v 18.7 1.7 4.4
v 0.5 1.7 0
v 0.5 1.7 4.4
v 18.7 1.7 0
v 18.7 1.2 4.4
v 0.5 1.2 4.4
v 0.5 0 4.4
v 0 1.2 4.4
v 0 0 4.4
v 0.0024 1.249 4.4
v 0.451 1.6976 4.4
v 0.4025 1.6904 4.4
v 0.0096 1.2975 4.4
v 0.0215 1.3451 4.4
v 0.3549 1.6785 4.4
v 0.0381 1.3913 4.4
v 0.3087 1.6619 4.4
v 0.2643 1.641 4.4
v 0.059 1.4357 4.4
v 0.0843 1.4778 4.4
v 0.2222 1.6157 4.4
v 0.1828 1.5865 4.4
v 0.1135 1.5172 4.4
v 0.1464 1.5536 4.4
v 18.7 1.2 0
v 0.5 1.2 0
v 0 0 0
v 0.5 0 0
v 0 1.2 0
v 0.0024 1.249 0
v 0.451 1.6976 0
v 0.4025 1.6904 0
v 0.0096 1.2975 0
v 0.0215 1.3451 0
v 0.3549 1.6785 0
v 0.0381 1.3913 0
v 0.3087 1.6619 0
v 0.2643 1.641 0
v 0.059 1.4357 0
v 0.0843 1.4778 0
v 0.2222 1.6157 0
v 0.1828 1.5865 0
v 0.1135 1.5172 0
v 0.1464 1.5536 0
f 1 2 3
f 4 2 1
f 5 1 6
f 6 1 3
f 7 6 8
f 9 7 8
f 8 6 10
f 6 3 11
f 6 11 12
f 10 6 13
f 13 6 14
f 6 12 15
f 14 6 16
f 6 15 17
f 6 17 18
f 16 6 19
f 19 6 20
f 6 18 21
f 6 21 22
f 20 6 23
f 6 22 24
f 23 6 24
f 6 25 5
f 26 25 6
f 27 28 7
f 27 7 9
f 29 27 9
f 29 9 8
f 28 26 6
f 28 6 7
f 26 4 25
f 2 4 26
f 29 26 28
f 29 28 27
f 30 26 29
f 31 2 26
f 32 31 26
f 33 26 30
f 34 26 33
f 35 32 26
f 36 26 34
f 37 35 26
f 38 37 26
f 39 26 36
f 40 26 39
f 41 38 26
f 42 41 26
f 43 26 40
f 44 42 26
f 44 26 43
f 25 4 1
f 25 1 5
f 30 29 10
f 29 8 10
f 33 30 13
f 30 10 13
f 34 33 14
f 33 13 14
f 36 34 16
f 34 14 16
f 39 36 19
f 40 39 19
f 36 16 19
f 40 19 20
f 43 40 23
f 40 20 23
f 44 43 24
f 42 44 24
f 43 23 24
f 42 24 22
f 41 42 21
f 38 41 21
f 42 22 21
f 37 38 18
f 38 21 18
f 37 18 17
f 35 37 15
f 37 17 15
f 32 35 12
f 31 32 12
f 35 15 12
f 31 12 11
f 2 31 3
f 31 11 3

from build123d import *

# Parameters (mm, degrees)
BOSS_EXTRU_1_DEPTH = 4.4
CONG_1_R           = 0.5


with BuildPart() as part:
    # Esquisse1 → Boss.-Extru.1 (new body)
    with BuildSketch(Plane.XY):
        Polygon((0, 0), (0, 1.7), (18.7, 1.7), (18.7, 1.2), (0.5, 1.2), (0.5, 0), align=None)
    extrude(amount=BOSS_EXTRU_1_DEPTH)

    # Congé1
    cong_1_edges = [part.edges().sort_by_distance(p)[0] for p in [
        (0, 1.7, 2.2),
    ]]
    fillet(cong_1_edges, radius=CONG_1_R)


solid = part.part
